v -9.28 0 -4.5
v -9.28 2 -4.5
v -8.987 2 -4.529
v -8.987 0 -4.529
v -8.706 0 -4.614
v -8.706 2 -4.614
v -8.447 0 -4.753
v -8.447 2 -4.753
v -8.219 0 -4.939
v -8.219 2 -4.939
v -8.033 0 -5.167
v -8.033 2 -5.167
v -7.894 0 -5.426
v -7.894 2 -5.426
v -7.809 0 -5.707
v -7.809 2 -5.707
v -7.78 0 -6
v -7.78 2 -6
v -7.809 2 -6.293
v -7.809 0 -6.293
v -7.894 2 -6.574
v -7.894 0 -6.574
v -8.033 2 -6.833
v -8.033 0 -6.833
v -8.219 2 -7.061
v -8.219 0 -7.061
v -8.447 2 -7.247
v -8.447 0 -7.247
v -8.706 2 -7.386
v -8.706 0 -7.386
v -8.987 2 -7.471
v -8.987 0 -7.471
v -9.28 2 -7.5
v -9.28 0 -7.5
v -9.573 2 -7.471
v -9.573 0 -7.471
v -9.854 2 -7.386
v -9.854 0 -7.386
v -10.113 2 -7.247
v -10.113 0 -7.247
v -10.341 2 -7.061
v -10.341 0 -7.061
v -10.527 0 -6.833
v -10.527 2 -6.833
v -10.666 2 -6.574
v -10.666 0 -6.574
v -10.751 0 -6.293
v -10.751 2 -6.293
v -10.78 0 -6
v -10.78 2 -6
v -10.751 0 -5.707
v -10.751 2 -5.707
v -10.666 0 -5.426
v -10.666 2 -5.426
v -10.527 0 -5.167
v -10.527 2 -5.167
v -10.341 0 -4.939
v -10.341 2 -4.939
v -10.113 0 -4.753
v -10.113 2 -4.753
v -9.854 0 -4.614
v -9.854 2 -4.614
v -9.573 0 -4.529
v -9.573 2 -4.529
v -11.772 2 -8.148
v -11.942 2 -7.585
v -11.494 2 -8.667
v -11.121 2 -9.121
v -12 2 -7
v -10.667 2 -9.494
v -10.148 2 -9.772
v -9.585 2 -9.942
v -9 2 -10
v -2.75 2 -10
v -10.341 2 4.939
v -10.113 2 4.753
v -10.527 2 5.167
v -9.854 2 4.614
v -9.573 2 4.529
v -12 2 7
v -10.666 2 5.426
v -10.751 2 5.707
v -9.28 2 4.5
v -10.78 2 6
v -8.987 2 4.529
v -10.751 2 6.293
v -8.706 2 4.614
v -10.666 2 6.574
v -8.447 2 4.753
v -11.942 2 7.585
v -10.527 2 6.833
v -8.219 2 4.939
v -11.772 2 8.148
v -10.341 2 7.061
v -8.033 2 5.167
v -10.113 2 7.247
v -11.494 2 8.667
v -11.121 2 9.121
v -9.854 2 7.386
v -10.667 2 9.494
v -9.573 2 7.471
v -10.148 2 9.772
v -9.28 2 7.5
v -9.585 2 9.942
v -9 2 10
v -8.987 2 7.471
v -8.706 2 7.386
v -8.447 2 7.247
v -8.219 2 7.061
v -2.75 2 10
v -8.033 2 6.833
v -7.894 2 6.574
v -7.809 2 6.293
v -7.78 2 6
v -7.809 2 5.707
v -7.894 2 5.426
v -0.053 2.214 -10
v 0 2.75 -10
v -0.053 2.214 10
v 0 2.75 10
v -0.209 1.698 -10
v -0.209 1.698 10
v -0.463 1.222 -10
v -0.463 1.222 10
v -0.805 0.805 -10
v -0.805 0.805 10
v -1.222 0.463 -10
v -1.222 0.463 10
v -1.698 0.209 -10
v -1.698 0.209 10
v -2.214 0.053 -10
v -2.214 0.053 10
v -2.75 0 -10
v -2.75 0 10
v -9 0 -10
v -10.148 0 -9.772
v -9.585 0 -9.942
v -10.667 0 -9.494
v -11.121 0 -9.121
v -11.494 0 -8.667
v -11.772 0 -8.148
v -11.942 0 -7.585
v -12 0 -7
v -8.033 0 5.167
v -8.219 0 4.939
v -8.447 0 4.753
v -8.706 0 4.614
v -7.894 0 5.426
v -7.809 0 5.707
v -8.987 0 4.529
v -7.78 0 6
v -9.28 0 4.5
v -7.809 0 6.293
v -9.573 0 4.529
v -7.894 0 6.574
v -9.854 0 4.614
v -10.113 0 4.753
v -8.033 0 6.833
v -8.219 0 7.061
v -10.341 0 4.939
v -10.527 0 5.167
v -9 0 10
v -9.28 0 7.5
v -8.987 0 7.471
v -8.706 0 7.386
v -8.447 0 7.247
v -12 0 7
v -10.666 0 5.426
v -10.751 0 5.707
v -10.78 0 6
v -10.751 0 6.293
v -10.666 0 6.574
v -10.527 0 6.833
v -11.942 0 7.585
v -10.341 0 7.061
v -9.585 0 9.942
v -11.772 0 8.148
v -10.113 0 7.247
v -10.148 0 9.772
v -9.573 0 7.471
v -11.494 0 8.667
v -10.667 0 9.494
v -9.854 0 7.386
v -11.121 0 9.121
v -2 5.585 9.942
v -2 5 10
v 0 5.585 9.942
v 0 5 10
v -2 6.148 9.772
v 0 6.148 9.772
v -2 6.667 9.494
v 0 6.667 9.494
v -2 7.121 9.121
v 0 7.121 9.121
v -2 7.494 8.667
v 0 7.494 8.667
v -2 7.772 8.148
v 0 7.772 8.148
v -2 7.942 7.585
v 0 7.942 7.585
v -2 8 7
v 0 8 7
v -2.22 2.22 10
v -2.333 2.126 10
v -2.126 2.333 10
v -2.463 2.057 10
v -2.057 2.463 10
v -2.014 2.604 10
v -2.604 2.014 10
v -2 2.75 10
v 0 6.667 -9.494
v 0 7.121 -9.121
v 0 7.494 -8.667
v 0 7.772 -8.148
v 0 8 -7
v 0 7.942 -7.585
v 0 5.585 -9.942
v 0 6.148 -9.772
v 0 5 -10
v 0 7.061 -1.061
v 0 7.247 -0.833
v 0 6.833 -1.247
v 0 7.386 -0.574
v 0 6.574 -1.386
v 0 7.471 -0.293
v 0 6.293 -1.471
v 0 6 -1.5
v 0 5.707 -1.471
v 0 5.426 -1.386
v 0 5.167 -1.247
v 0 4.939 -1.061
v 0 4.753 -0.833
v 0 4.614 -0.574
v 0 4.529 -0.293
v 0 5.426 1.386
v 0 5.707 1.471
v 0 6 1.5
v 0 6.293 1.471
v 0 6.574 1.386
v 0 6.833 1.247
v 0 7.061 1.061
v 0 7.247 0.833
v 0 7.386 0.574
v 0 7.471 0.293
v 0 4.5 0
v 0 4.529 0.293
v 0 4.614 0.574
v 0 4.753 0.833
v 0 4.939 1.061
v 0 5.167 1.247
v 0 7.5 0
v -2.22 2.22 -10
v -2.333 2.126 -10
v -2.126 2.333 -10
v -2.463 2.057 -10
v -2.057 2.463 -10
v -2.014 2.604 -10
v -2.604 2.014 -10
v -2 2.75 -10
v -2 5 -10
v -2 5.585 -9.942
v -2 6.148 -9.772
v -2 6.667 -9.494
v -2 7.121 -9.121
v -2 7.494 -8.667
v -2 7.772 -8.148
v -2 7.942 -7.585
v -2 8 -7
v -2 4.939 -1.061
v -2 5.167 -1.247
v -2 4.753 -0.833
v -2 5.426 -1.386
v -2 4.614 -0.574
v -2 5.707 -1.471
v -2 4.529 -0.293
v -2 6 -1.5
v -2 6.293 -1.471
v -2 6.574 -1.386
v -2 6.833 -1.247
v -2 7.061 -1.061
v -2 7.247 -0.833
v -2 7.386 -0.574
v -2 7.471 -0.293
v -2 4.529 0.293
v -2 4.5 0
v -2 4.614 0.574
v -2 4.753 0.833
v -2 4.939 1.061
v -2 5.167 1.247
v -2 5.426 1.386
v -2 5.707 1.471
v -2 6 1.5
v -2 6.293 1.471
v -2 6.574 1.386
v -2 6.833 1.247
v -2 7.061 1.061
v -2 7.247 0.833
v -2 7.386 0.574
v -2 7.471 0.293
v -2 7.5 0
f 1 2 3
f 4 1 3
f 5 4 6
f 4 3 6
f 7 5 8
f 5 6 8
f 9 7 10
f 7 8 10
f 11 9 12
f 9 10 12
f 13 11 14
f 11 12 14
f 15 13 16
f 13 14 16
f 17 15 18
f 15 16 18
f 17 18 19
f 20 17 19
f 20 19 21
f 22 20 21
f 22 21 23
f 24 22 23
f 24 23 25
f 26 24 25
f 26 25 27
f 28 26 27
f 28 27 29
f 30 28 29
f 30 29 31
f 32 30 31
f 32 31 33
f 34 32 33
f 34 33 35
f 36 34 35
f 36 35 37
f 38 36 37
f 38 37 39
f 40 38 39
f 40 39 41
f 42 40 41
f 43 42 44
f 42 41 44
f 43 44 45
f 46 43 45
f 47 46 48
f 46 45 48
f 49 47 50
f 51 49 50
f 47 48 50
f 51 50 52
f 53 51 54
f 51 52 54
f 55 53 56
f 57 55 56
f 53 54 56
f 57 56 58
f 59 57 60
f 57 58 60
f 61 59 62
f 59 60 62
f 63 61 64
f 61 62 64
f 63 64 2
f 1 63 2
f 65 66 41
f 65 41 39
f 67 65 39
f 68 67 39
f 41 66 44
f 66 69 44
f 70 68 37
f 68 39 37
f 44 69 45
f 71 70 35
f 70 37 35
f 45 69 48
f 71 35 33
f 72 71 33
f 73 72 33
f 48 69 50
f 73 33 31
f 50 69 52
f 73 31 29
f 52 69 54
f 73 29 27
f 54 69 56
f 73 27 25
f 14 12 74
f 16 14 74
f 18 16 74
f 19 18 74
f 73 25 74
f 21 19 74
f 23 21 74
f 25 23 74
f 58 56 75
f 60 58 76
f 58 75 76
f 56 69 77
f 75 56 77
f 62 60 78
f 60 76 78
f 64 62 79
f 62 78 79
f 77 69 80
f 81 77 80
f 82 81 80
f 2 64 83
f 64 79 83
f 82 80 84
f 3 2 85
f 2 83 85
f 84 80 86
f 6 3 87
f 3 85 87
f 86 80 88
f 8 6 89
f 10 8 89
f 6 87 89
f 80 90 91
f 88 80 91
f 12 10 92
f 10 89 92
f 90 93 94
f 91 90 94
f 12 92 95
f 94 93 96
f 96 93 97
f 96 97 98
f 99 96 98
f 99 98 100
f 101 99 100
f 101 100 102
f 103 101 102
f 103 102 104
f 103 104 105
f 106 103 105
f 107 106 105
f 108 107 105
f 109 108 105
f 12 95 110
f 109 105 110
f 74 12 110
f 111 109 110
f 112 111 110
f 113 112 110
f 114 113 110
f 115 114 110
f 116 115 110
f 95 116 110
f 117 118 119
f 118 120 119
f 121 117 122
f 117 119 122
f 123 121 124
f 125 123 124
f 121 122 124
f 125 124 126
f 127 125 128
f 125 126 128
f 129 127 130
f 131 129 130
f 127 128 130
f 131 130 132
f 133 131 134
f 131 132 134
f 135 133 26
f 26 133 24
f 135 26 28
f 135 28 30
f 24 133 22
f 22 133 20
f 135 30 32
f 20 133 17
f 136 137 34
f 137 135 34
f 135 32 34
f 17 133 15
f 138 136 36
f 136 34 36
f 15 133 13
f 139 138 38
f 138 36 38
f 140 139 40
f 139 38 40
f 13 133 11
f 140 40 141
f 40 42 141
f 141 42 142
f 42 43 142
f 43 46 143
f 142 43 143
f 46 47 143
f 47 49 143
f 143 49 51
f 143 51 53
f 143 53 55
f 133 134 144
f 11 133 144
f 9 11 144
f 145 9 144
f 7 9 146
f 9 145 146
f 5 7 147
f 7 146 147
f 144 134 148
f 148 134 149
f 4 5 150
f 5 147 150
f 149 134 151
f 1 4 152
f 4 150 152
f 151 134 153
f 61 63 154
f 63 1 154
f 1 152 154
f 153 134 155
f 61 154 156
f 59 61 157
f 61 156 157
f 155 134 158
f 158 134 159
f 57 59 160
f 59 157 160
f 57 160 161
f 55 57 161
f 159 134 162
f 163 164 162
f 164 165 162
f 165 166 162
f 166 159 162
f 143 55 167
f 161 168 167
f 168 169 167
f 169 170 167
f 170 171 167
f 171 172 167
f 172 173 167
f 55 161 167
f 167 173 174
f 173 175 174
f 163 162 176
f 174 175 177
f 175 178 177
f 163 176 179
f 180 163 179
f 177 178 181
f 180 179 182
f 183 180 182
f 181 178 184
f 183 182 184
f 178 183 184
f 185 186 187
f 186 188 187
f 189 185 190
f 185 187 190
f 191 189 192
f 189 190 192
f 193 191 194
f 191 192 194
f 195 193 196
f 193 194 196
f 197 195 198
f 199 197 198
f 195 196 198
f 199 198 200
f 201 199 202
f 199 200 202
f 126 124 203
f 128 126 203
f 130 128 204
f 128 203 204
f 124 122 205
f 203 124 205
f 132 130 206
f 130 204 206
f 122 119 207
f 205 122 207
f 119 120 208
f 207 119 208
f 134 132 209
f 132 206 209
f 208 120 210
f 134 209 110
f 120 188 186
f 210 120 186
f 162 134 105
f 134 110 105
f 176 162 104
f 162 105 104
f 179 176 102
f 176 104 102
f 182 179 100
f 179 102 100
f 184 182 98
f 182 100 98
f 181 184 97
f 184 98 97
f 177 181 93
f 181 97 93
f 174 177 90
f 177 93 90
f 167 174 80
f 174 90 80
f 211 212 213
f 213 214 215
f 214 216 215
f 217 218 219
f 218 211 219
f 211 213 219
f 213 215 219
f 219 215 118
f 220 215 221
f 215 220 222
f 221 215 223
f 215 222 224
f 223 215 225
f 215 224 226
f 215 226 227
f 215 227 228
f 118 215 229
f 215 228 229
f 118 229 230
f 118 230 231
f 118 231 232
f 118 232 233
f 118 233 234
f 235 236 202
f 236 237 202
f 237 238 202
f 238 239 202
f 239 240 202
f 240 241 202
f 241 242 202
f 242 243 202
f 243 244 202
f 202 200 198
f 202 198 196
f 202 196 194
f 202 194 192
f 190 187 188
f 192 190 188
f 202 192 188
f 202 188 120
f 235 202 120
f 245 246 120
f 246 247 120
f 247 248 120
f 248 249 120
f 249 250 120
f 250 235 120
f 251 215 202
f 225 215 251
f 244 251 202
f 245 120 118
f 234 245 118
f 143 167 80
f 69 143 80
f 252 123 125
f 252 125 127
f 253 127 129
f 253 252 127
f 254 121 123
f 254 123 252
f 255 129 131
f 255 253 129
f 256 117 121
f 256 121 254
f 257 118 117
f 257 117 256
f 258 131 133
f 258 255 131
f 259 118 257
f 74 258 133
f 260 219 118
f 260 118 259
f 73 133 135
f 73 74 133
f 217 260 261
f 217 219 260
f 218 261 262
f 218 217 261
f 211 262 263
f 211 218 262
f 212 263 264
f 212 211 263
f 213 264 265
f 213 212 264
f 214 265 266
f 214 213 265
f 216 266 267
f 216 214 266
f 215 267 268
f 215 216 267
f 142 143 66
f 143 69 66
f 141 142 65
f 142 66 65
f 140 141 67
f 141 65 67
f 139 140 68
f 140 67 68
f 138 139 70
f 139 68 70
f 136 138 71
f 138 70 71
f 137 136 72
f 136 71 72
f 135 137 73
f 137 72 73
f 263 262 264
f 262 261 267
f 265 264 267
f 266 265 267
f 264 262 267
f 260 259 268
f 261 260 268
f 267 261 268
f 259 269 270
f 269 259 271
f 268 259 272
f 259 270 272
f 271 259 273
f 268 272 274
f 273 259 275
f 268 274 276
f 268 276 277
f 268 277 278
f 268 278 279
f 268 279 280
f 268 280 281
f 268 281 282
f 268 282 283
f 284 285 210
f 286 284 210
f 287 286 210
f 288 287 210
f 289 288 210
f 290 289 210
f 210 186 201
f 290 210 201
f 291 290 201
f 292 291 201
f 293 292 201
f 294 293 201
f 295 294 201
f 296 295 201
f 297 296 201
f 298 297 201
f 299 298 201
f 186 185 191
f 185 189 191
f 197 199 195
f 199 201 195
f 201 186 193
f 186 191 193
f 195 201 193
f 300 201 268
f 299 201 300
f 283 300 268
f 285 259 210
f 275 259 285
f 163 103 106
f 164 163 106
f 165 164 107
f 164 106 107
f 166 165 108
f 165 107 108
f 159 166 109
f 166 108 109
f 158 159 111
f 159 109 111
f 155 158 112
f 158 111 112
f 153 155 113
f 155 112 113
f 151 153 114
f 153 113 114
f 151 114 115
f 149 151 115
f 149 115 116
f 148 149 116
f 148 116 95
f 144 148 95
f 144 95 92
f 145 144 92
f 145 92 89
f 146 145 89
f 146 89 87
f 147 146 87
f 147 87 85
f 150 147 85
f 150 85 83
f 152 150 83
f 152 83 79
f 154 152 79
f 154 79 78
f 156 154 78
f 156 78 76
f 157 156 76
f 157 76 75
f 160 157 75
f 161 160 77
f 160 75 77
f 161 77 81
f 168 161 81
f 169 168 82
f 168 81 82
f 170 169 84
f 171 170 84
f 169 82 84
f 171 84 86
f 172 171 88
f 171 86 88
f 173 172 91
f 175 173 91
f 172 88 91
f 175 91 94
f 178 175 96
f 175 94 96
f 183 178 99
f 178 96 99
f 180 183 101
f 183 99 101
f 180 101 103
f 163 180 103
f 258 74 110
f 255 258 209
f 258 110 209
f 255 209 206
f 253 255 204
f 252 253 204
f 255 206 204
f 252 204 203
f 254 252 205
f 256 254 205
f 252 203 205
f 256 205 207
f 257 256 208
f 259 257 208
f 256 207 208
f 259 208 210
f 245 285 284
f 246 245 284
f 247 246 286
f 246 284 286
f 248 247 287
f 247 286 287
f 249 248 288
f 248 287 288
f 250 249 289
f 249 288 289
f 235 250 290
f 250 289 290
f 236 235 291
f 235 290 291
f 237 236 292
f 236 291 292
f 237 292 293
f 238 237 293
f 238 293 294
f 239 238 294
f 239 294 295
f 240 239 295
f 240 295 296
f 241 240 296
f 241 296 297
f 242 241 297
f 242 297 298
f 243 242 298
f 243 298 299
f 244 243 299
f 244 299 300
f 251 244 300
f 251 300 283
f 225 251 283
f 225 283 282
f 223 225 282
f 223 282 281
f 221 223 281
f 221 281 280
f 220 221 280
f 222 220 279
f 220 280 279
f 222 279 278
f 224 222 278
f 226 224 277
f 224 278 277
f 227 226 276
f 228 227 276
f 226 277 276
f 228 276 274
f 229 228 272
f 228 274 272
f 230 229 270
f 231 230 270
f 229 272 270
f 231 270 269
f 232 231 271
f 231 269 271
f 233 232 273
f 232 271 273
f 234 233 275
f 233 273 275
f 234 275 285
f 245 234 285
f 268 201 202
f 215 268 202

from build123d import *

# Parameters (mm, degrees)
BASE_FLANGE1_DEPTH = 10
FILLET1_R          = 3
SKETCH5_R          = 1.5
CUT_EXTRUDE1_DEPTH = 17.733200531
SKETCH6_R          = 1.5
CUT_EXTRUDE2_DEPTH = 17.248076809


# Sheet-metal steps are written as plain solids
with BuildPart() as part:
    # Sketch2 → Base-Flange1 (new, symmetric)
    with BuildSketch(Plane.XY):
        with BuildLine():
            Line((0, 8), (0, 2.75))
            ThreePointArc((0, 2.75), (-0.805456352, 0.805456352), (-2.75, 0))
            Line((-2.75, 0), (-12, 0))
            Line((-12, 0), (-12, 2))
            Line((-12, 2), (-2.75, 2))
            ThreePointArc((-2.75, 2), (-2.219669914, 2.219669914), (-2, 2.75))
            Line((-2, 2.75), (-2, 8))
            Line((-2, 8), (0, 8))
        make_face()
    extrude(amount=BASE_FLANGE1_DEPTH, both=True)

    # Fillet1
    fillet1_edges = [part.edges().sort_by_distance(p)[0] for p in [
        (-1, 8, 10),
        (-1, 8, -10),
        (-12, 1, 10),
        (-12, 1, -10),
    ]]
    fillet(fillet1_edges, radius=FILLET1_R)

    # Sketch5 → Cut-Extrude1 (cut, through all)
    with BuildSketch(Plane(origin=(0, 2, 0), x_dir=(1, 0, 0), z_dir=(0, 1, 0))):
        with Locations(Location((-9.28, 6, 0), (0, 0, 270))):
            Circle(SKETCH5_R)
        with Locations(Location((-9.28, -6, 0), (0, 0, 270))):
            Circle(SKETCH5_R)
    extrude(amount=-CUT_EXTRUDE1_DEPTH, mode=Mode.SUBTRACT)

    # Sketch6 → Cut-Extrude2 (cut, through all)
    with BuildSketch(Plane.ZY.offset(2)):
        with Locations(Location((0, 6, 0), (0, 0, 270))):
            Circle(SKETCH6_R)
    extrude(amount=-CUT_EXTRUDE2_DEPTH, mode=Mode.SUBTRACT)


solid = part.part
